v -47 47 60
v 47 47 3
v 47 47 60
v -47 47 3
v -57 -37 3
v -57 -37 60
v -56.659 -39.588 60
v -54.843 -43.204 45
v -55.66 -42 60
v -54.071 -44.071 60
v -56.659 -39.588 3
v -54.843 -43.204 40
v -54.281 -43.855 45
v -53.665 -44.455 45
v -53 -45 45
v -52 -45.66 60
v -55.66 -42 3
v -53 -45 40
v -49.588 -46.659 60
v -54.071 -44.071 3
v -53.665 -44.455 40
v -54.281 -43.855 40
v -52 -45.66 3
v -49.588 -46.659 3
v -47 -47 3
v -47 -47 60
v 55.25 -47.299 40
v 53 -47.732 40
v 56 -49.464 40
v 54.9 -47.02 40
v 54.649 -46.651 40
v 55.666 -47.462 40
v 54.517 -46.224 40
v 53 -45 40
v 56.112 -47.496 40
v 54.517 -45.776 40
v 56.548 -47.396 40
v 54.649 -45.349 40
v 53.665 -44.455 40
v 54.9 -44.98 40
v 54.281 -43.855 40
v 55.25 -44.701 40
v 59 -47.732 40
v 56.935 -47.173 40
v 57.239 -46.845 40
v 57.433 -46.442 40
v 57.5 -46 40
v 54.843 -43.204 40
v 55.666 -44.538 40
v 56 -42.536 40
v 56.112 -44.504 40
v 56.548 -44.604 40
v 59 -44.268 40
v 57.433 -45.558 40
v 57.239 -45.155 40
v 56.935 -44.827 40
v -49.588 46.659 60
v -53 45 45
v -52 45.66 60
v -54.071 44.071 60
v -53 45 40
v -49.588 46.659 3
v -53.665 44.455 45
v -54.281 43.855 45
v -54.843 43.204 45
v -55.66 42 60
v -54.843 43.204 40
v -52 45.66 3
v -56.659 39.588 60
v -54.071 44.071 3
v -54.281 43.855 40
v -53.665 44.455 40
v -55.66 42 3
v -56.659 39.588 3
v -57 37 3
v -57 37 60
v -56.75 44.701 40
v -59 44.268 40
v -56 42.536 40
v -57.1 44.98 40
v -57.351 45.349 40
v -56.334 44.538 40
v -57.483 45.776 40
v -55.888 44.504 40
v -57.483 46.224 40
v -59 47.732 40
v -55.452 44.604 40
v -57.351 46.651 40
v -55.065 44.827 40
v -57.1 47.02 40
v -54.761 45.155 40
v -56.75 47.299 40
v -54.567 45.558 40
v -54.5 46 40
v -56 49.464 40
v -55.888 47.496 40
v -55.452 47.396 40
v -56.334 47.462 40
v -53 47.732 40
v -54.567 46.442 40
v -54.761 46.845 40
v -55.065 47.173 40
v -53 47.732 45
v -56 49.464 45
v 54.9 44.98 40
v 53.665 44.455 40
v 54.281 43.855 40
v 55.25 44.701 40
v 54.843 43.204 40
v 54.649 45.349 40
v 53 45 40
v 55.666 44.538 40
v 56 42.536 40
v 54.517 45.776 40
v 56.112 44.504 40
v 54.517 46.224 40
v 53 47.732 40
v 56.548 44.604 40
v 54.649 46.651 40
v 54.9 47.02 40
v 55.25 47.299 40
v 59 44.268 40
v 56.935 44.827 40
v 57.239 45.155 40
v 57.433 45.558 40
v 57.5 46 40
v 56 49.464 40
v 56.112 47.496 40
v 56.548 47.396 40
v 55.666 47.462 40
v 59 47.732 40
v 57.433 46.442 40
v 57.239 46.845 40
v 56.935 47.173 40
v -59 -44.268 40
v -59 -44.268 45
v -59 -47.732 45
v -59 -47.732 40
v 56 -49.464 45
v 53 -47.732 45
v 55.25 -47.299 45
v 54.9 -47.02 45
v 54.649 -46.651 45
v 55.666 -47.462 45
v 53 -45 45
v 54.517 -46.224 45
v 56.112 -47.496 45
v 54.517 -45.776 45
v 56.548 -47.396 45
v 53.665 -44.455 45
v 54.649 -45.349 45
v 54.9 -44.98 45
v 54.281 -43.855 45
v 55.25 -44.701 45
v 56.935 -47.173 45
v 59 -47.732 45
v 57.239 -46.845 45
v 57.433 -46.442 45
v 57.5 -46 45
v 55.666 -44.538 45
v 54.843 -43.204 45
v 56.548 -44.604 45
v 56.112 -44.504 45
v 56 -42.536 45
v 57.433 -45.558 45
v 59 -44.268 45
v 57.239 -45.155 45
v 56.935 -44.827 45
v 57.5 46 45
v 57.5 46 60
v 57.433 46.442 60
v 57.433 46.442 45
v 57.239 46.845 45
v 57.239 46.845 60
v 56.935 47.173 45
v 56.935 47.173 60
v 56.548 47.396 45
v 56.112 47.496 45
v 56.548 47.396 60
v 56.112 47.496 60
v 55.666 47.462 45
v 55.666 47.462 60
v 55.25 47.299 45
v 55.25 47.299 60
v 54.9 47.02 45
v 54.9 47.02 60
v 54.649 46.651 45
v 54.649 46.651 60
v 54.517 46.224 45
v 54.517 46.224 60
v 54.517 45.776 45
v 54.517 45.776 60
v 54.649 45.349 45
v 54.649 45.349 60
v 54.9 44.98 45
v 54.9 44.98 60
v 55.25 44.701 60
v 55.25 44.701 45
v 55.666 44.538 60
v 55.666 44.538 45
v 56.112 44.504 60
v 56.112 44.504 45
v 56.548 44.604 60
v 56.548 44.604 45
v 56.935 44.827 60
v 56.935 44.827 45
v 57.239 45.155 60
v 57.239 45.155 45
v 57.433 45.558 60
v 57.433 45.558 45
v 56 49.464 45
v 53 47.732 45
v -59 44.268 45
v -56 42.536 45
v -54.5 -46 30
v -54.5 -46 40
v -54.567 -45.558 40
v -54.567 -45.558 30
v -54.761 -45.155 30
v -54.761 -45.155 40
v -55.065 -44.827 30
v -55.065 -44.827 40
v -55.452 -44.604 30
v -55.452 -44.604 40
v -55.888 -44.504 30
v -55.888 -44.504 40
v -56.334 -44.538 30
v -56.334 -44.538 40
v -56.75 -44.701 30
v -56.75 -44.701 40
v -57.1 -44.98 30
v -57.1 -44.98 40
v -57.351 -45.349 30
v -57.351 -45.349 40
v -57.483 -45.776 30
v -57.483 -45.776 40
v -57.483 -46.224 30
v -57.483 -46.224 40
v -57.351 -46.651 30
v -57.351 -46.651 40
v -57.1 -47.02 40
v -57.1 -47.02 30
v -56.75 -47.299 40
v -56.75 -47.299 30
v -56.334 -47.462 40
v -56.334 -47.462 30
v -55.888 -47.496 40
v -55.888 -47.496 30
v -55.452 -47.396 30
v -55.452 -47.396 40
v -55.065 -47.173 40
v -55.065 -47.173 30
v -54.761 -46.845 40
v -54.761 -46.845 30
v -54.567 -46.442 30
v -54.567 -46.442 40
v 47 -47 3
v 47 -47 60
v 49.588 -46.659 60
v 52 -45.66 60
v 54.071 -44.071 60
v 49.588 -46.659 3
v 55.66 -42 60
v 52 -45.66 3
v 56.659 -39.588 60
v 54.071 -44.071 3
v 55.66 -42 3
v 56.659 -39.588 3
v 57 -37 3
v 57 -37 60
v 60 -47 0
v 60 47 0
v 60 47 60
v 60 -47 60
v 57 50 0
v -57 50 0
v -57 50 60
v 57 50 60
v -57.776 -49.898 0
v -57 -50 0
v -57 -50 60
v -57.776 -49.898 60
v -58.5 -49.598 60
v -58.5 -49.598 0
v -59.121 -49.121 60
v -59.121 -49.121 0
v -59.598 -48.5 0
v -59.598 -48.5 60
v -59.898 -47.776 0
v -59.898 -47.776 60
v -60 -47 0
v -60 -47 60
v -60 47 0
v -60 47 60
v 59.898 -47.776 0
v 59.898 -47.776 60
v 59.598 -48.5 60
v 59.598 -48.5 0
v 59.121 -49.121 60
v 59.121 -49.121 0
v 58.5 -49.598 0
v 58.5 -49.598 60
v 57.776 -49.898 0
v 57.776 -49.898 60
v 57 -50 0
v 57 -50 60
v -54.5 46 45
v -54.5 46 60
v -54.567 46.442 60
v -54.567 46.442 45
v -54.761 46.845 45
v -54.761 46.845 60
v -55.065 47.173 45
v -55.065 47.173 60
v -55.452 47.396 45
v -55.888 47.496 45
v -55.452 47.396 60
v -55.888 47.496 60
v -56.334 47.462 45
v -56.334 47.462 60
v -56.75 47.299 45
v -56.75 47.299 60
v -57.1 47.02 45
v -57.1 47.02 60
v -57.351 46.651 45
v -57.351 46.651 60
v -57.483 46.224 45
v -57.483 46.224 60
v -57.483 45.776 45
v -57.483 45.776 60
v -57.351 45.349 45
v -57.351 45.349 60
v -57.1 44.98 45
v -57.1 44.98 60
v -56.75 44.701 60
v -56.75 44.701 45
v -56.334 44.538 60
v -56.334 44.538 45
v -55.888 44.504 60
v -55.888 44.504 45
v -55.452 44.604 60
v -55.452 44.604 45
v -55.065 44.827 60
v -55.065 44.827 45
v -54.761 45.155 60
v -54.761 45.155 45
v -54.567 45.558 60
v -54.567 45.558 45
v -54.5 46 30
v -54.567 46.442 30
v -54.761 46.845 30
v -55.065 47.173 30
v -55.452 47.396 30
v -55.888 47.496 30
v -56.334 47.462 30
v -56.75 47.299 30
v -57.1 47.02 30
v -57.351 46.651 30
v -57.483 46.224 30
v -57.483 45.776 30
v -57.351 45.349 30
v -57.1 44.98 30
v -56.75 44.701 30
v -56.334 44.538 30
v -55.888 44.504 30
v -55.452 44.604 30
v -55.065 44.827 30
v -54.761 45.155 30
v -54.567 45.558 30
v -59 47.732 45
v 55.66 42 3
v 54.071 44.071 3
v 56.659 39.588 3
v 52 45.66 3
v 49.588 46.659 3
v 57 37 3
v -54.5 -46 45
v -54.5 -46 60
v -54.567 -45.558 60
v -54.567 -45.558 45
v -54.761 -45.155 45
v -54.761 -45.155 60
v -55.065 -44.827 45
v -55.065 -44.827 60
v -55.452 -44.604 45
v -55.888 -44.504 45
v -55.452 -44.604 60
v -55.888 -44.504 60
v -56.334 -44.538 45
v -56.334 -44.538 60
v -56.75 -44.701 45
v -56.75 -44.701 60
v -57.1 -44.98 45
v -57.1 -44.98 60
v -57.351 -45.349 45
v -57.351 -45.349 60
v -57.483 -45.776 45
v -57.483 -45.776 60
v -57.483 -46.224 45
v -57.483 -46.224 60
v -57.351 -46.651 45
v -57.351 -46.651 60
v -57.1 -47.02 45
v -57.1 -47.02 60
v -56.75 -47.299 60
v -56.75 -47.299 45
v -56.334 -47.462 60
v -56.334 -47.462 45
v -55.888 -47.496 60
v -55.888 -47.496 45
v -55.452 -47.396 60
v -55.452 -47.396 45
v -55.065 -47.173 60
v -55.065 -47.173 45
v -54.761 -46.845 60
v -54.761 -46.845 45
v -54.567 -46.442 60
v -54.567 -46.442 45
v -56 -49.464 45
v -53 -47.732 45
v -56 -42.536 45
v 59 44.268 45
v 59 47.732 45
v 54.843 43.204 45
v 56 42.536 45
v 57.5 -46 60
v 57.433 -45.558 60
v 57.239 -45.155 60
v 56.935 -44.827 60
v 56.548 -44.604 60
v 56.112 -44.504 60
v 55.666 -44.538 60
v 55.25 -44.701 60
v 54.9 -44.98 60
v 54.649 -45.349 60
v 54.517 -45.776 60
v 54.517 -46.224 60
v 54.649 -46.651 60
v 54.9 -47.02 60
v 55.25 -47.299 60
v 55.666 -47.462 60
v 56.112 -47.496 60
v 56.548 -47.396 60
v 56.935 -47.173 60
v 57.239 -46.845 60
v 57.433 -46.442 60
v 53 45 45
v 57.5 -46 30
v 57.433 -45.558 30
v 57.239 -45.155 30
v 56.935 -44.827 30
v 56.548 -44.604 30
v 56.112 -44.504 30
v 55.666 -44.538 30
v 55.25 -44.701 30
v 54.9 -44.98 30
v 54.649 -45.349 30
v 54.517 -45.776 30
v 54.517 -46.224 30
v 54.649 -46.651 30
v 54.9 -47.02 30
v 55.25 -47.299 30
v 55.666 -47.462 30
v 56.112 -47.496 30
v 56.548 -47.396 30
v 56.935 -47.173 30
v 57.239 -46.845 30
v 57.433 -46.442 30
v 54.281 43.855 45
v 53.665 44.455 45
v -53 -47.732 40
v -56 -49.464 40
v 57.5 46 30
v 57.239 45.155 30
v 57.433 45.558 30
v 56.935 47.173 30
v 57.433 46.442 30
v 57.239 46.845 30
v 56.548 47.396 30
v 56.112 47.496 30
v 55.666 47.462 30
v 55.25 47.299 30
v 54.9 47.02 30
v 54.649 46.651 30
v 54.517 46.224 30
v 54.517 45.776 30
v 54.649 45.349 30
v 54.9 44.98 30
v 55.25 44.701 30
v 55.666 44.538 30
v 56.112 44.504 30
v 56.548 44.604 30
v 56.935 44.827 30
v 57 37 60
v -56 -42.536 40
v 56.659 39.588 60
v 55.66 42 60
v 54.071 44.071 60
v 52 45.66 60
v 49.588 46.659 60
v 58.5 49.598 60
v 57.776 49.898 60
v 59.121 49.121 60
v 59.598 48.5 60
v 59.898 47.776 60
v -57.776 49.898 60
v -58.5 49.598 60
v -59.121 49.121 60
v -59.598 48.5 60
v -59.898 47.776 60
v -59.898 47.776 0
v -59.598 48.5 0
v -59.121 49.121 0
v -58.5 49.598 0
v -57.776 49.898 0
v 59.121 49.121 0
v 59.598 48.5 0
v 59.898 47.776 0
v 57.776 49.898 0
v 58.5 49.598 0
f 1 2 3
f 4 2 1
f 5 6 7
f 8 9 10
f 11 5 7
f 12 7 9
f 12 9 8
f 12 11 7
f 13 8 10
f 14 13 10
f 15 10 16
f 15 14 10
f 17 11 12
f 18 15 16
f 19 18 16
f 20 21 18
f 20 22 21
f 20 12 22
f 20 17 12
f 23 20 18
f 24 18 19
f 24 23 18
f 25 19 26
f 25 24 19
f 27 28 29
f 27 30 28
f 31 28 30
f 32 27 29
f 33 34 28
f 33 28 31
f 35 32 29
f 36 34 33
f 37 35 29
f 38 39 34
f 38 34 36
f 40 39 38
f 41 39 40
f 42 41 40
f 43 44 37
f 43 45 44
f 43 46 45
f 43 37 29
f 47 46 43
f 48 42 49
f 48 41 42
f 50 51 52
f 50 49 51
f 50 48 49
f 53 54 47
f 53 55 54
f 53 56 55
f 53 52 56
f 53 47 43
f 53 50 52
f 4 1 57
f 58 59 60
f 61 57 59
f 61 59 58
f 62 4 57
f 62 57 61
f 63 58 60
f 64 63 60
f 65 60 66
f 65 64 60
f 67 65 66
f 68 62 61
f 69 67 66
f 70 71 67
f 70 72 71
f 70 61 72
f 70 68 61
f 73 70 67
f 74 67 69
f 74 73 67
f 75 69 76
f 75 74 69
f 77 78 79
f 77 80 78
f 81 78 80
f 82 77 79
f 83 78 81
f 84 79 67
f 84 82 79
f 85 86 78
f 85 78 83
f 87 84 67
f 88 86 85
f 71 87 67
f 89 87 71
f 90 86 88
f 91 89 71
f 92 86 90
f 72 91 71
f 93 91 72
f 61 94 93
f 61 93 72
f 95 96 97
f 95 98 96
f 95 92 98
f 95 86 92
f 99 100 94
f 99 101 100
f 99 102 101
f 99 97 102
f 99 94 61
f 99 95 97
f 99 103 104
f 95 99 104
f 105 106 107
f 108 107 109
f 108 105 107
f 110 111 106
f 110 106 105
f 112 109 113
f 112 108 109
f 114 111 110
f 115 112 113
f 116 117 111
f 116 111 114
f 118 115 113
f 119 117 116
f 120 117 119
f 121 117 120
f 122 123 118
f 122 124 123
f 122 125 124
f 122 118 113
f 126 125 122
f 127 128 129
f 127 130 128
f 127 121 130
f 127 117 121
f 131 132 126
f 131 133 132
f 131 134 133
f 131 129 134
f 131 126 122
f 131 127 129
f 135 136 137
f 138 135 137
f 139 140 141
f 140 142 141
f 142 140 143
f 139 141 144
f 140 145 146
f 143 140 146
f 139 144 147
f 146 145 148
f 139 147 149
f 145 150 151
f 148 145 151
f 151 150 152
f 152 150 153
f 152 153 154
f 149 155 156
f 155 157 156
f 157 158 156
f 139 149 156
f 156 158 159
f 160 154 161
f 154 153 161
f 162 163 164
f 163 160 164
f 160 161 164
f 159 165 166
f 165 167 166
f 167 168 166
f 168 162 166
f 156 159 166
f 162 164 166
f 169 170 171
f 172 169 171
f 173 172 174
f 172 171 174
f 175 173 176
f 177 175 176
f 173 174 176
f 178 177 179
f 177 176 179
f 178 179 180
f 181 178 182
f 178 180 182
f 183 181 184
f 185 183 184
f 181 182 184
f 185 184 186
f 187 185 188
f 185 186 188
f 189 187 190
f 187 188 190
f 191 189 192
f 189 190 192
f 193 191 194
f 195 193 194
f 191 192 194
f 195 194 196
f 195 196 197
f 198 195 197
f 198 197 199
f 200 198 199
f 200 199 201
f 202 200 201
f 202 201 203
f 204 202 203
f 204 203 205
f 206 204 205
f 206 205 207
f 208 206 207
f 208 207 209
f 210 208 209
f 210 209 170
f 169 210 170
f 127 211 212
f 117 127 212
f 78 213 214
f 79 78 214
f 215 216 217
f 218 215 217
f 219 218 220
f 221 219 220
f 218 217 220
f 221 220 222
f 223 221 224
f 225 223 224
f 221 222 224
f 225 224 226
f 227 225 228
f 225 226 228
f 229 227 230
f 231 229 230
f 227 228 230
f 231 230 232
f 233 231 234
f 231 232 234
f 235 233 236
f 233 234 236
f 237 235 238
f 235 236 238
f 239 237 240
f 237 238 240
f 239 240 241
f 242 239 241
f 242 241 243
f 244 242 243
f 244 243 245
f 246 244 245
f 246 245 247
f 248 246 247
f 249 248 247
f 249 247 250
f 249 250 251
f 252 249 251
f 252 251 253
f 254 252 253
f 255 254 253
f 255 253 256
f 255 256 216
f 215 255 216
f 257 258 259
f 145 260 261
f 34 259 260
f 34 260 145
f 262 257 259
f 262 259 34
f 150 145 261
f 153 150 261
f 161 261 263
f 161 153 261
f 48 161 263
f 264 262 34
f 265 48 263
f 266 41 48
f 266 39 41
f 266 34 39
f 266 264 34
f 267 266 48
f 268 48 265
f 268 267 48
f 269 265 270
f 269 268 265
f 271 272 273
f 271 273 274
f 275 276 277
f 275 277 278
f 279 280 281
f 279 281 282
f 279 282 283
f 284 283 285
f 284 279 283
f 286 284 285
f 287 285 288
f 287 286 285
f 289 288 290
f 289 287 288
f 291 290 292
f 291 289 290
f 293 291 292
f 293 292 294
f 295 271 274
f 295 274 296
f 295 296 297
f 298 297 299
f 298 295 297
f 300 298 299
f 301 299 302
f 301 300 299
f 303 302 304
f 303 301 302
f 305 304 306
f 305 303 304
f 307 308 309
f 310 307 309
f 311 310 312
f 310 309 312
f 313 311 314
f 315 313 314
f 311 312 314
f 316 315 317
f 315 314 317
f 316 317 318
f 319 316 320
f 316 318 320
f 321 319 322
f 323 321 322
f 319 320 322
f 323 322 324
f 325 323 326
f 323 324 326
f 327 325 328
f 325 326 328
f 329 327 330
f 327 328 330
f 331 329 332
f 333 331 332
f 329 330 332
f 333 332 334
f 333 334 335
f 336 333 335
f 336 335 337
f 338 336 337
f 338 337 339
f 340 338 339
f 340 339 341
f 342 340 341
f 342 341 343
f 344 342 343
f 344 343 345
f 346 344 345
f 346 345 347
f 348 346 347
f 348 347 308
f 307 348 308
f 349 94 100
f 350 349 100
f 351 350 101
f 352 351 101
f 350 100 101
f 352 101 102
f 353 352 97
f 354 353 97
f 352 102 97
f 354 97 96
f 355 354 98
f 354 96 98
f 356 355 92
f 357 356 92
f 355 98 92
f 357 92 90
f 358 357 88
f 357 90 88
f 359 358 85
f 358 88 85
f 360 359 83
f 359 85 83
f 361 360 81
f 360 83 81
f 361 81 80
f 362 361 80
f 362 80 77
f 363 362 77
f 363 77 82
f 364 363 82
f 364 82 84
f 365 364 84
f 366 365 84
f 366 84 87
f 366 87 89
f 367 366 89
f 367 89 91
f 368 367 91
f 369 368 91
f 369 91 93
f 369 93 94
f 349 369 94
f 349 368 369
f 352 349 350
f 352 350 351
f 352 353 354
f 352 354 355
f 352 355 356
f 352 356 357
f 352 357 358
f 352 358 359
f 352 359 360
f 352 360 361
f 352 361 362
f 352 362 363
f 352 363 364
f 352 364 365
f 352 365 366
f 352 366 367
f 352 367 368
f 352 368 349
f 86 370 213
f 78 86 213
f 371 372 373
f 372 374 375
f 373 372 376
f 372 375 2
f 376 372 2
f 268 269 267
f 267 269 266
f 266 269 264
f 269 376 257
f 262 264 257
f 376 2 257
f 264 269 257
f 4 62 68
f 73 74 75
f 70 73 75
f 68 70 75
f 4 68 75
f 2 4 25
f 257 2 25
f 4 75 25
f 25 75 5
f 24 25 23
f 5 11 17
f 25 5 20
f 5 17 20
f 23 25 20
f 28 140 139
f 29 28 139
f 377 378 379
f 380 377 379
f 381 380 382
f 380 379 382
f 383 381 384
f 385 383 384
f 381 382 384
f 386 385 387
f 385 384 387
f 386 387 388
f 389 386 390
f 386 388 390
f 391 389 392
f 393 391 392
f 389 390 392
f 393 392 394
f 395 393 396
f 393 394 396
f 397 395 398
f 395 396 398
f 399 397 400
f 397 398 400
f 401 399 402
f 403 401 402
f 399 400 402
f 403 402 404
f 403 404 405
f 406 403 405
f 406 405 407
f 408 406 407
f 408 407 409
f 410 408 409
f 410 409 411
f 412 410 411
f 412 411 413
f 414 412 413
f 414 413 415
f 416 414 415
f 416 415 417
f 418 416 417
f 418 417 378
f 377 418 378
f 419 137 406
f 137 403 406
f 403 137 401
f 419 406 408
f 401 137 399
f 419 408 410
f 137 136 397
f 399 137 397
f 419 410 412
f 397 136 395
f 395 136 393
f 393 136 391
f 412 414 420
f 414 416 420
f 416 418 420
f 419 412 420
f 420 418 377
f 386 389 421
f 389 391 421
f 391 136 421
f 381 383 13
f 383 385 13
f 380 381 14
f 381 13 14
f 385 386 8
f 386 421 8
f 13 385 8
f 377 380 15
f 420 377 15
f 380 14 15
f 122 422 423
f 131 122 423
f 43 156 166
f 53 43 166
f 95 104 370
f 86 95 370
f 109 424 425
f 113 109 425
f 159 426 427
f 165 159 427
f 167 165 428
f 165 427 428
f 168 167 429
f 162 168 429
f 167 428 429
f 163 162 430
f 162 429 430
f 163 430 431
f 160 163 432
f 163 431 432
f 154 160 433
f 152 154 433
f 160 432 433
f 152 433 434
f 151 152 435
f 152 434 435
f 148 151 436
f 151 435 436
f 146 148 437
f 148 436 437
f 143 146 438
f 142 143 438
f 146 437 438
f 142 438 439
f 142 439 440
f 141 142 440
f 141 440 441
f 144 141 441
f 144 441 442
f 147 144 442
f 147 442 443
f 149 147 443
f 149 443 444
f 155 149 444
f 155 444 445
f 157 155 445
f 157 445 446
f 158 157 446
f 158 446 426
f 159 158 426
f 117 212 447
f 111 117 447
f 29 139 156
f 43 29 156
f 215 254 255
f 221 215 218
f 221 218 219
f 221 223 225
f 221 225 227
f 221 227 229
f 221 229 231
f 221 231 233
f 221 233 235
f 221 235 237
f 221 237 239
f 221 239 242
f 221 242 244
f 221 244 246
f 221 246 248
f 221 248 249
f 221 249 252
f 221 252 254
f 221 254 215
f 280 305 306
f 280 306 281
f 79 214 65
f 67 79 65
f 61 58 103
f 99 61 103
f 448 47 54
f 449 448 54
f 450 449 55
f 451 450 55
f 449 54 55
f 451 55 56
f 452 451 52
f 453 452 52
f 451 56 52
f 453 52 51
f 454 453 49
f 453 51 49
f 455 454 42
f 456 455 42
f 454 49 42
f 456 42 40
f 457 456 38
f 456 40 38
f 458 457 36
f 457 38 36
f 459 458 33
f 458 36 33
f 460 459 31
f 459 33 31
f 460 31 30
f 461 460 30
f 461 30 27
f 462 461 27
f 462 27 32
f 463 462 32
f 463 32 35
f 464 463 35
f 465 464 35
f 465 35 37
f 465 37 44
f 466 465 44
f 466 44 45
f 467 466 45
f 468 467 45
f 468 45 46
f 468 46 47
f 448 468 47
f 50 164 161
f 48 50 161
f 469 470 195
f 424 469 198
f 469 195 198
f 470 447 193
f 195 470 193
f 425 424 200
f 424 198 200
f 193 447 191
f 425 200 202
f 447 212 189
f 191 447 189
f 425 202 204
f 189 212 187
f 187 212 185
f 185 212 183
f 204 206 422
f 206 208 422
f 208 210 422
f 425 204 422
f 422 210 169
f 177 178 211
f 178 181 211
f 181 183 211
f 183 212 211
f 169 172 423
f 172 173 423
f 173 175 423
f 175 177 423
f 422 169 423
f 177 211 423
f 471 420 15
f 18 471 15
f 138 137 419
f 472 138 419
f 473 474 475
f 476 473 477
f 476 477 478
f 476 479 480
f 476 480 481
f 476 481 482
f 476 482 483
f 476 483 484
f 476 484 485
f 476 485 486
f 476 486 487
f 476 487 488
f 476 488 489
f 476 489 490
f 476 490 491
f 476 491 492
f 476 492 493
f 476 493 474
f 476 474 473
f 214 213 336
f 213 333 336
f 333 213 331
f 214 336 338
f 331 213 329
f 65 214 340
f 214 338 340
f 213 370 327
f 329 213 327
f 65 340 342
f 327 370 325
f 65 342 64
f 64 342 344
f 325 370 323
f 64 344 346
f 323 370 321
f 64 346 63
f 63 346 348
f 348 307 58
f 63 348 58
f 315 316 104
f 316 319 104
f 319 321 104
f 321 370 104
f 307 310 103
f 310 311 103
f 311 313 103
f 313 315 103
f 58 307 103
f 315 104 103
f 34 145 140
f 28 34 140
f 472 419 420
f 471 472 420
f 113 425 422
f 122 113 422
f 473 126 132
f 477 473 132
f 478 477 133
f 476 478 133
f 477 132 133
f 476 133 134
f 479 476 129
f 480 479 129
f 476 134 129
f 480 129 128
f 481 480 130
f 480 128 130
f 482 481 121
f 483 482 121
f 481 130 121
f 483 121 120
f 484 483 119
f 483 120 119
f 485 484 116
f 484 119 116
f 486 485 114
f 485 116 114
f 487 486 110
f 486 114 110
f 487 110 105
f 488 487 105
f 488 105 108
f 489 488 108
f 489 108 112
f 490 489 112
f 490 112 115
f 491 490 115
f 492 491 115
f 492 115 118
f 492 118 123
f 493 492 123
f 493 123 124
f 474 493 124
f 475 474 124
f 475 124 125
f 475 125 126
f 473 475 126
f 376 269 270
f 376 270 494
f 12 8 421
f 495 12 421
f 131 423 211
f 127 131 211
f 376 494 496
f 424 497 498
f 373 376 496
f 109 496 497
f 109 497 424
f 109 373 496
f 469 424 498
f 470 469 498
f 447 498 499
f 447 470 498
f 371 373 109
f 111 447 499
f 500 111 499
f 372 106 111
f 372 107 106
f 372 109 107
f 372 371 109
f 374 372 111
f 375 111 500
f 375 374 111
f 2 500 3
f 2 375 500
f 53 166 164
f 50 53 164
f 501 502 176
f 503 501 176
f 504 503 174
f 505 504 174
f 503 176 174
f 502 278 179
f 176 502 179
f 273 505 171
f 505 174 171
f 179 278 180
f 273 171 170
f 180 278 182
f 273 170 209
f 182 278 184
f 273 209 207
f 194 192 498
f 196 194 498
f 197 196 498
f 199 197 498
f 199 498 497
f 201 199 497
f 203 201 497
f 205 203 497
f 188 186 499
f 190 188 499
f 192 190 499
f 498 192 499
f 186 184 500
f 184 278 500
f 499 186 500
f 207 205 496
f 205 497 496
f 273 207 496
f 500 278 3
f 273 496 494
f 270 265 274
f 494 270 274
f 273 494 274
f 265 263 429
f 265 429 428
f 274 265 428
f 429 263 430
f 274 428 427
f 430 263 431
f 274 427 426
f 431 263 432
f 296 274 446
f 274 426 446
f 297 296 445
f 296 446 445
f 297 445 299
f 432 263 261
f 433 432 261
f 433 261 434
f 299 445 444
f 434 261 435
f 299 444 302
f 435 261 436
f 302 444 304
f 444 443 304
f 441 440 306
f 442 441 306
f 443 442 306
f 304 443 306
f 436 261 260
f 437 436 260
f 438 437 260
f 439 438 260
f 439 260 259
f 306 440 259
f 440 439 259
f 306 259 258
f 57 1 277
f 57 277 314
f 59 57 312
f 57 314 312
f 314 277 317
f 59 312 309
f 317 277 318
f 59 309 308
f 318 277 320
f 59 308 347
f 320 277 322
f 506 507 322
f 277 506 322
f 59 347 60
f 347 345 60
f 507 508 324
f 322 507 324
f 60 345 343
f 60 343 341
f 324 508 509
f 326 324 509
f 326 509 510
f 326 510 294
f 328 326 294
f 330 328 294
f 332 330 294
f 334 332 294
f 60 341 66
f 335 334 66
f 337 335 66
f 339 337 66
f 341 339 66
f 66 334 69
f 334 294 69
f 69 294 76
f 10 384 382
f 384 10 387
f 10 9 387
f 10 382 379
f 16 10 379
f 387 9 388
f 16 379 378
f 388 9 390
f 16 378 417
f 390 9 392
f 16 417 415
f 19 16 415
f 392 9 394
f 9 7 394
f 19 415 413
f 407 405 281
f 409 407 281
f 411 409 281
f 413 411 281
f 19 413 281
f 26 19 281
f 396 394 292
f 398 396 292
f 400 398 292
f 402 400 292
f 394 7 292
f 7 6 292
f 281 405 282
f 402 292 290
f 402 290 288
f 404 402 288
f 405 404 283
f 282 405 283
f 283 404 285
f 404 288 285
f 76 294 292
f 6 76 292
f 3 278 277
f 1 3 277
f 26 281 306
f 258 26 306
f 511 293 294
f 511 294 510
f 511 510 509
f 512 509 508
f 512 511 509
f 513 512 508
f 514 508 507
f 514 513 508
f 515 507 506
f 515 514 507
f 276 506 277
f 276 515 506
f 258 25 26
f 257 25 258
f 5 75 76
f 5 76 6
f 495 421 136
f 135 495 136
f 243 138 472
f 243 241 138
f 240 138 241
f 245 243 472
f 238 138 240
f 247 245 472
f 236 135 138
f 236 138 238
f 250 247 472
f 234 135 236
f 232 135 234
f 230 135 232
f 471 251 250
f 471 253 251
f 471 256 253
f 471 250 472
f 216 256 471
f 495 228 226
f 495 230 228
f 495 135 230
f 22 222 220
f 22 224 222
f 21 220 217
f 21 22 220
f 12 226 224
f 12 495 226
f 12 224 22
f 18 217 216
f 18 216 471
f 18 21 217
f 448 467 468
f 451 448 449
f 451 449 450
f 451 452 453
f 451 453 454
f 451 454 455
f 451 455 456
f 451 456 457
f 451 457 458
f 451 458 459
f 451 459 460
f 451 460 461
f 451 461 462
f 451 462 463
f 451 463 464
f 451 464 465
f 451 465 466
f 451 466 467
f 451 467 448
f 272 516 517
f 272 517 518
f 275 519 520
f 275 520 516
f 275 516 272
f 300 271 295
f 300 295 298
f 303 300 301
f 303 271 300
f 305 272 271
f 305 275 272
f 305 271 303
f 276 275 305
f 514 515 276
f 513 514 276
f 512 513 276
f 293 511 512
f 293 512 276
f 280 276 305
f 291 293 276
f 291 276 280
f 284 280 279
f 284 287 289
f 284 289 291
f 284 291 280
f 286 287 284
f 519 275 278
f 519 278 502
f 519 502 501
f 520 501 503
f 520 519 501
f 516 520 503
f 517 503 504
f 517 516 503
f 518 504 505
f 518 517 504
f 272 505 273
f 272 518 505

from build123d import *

# Parameters (mm, degrees)
BOSS_EXTRUDE1_DEPTH = 3
BOSS_EXTRUDE2_DEPTH = 60
SKETCH3_R           = 1.5
CUT_EXTRUDE1_DEPTH  = 30
CUT_EXTRUDE2_START  = -15
SKETCH3_3_R         = 1.5
CUT_EXTRUDE2_DEPTH  = 5


with BuildPart() as part:
    # Sketch1 → Boss-Extrude1 (new body)
    with BuildSketch(Plane(origin=(0, 0, 0), x_dir=(0, 1, 0), z_dir=(0, 0, 1))):
        with BuildLine():
            ThreePointArc((-50, -57), (-49.121320344, -59.121320344), (-47, -60))
            Line((-47, -60), (47, -60))
            ThreePointArc((47, -60), (49.121320344, -59.121320344), (50, -57))
            Line((50, -57), (50, 57))
            ThreePointArc((50, 57), (49.121320344, 59.121320344), (47, 60))
            Line((47, 60), (-47, 60))
            ThreePointArc((-47, 60), (-49.121320344, 59.121320344), (-50, 57))
            Line((-50, 57), (-50, -57))
        make_face()
    extrude(amount=BOSS_EXTRUDE1_DEPTH)

    # Sketch1<3> → Boss-Extrude2 (add)
    with BuildSketch(Plane(origin=(0, 0, 0), x_dir=(0, 1, 0), z_dir=(0, 0, 1))):
        with BuildLine():
            ThreePointArc((-50, -57), (-49.121320344, -59.121320344), (-47, -60))
            Line((-47, -60), (47, -60))
            ThreePointArc((47, -60), (49.121320344, -59.121320344), (50, -57))
            Line((50, -57), (50, 57))
            ThreePointArc((50, 57), (49.121320344, 59.121320344), (47, 60))
            Line((47, 60), (-47, 60))
            ThreePointArc((-47, 60), (-49.121320344, 59.121320344), (-50, 57))
            Line((-50, 57), (-50, -57))
        make_face()
        with BuildLine():
            Line((-47, -47), (-47, 47))
            ThreePointArc((-47, 47), (-44.071067812, 54.071067812), (-37, 57))
            Line((-37, 57), (37, 57))
            ThreePointArc((37, 57), (44.071067812, 54.071067812), (47, 47))
            Line((47, 47), (47, -47))
            ThreePointArc((47, -47), (44.071067812, -54.071067812), (37, -57))
            Line((37, -57), (-37, -57))
            ThreePointArc((-37, -57), (-44.071067812, -54.071067812), (-47, -47))
        make_face(mode=Mode.SUBTRACT)
    extrude(amount=BOSS_EXTRUDE2_DEPTH)

    # Sketch3 → Cut-Extrude1 (cut)
    with BuildSketch(Plane.XY.offset(60)):
        with Locations((-56, 46)):
            Circle(SKETCH3_R)
        with Locations((56, 46)):
            Circle(SKETCH3_R)
        with Locations((56, -46)):
            Circle(SKETCH3_R)
        with Locations((-56, -46)):
            Circle(SKETCH3_R)
    extrude(amount=-CUT_EXTRUDE1_DEPTH, mode=Mode.SUBTRACT)

    # Sketch3<3> → Cut-Extrude2 (cut)
    # profile 1 of 4: a face of its own
    with BuildSketch(Plane.XY.offset(60).offset(CUT_EXTRUDE2_START)):
        with BuildLine():
            Line((59, 47.732050808), (56, 49.464101615))
            Line((56, 49.464101615), (53, 47.732050808))
            Line((53, 47.732050808), (53, 45))
            ThreePointArc((53, 45), (53.979459017, 44.161504858), (54.842890525, 43.203955852))
            Line((54.842890525, 43.203955852), (56, 42.535898385))
            Line((56, 42.535898385), (59, 44.267949192))
            Line((59, 44.267949192), (59, 47.732050808))
        make_face()
        with Locations((56, 46)):
            Circle(SKETCH3_3_R, mode=Mode.SUBTRACT)
    # profile 2 of 4: a face of its own
    with BuildSketch(Plane.XY.offset(60).offset(CUT_EXTRUDE2_START)):
        with BuildLine():
            Line((-53, 45), (-53, 47.732050808))
            Line((-53, 47.732050808), (-56, 49.464101615))
            Line((-56, 49.464101615), (-59, 47.732050808))
            Line((-59, 47.732050808), (-59, 44.267949192))
            Line((-59, 44.267949192), (-56, 42.535898385))
            Line((-56, 42.535898385), (-54.842890525, 43.203955852))
            ThreePointArc((-54.842890525, 43.203955852), (-53.979459017, 44.161504858), (-53, 45))
        make_face()
        with Locations((-56, 46)):
            Circle(SKETCH3_3_R, mode=Mode.SUBTRACT)
    # profile 3 of 4: a face of its own
    with BuildSketch(Plane.XY.offset(60).offset(CUT_EXTRUDE2_START)):
        with BuildLine():
            Line((59, -44.267949192), (56, -42.535898385))
            Line((56, -42.535898385), (54.842890525, -43.203955852))
            ThreePointArc((54.842890525, -43.203955852), (53.979459017, -44.161504858), (53, -45))
            Line((53, -45), (53, -47.732050808))
            Line((53, -47.732050808), (56, -49.464101615))
            Line((56, -49.464101615), (59, -47.732050808))
            Line((59, -47.732050808), (59, -44.267949192))
        make_face()
        with Locations((56, -46)):
            Circle(SKETCH3_3_R, mode=Mode.SUBTRACT)
    # profile 4 of 4: a face of its own
    with BuildSketch(Plane.XY.offset(60).offset(CUT_EXTRUDE2_START)):
        with BuildLine():
            Line((-54.842890525, -43.203955852), (-56, -42.535898385))
            Line((-56, -42.535898385), (-59, -44.267949192))
            Line((-59, -44.267949192), (-59, -47.732050808))
            Line((-59, -47.732050808), (-56, -49.464101615))
            Line((-56, -49.464101615), (-53, -47.732050808))
            Line((-53, -47.732050808), (-53, -45))
            ThreePointArc((-53, -45), (-53.979459017, -44.161504858), (-54.842890525, -43.203955852))
        make_face()
        with Locations((-56, -46)):
            Circle(SKETCH3_3_R, mode=Mode.SUBTRACT)
    extrude(amount=-CUT_EXTRUDE2_DEPTH, mode=Mode.SUBTRACT)


solid = part.part
